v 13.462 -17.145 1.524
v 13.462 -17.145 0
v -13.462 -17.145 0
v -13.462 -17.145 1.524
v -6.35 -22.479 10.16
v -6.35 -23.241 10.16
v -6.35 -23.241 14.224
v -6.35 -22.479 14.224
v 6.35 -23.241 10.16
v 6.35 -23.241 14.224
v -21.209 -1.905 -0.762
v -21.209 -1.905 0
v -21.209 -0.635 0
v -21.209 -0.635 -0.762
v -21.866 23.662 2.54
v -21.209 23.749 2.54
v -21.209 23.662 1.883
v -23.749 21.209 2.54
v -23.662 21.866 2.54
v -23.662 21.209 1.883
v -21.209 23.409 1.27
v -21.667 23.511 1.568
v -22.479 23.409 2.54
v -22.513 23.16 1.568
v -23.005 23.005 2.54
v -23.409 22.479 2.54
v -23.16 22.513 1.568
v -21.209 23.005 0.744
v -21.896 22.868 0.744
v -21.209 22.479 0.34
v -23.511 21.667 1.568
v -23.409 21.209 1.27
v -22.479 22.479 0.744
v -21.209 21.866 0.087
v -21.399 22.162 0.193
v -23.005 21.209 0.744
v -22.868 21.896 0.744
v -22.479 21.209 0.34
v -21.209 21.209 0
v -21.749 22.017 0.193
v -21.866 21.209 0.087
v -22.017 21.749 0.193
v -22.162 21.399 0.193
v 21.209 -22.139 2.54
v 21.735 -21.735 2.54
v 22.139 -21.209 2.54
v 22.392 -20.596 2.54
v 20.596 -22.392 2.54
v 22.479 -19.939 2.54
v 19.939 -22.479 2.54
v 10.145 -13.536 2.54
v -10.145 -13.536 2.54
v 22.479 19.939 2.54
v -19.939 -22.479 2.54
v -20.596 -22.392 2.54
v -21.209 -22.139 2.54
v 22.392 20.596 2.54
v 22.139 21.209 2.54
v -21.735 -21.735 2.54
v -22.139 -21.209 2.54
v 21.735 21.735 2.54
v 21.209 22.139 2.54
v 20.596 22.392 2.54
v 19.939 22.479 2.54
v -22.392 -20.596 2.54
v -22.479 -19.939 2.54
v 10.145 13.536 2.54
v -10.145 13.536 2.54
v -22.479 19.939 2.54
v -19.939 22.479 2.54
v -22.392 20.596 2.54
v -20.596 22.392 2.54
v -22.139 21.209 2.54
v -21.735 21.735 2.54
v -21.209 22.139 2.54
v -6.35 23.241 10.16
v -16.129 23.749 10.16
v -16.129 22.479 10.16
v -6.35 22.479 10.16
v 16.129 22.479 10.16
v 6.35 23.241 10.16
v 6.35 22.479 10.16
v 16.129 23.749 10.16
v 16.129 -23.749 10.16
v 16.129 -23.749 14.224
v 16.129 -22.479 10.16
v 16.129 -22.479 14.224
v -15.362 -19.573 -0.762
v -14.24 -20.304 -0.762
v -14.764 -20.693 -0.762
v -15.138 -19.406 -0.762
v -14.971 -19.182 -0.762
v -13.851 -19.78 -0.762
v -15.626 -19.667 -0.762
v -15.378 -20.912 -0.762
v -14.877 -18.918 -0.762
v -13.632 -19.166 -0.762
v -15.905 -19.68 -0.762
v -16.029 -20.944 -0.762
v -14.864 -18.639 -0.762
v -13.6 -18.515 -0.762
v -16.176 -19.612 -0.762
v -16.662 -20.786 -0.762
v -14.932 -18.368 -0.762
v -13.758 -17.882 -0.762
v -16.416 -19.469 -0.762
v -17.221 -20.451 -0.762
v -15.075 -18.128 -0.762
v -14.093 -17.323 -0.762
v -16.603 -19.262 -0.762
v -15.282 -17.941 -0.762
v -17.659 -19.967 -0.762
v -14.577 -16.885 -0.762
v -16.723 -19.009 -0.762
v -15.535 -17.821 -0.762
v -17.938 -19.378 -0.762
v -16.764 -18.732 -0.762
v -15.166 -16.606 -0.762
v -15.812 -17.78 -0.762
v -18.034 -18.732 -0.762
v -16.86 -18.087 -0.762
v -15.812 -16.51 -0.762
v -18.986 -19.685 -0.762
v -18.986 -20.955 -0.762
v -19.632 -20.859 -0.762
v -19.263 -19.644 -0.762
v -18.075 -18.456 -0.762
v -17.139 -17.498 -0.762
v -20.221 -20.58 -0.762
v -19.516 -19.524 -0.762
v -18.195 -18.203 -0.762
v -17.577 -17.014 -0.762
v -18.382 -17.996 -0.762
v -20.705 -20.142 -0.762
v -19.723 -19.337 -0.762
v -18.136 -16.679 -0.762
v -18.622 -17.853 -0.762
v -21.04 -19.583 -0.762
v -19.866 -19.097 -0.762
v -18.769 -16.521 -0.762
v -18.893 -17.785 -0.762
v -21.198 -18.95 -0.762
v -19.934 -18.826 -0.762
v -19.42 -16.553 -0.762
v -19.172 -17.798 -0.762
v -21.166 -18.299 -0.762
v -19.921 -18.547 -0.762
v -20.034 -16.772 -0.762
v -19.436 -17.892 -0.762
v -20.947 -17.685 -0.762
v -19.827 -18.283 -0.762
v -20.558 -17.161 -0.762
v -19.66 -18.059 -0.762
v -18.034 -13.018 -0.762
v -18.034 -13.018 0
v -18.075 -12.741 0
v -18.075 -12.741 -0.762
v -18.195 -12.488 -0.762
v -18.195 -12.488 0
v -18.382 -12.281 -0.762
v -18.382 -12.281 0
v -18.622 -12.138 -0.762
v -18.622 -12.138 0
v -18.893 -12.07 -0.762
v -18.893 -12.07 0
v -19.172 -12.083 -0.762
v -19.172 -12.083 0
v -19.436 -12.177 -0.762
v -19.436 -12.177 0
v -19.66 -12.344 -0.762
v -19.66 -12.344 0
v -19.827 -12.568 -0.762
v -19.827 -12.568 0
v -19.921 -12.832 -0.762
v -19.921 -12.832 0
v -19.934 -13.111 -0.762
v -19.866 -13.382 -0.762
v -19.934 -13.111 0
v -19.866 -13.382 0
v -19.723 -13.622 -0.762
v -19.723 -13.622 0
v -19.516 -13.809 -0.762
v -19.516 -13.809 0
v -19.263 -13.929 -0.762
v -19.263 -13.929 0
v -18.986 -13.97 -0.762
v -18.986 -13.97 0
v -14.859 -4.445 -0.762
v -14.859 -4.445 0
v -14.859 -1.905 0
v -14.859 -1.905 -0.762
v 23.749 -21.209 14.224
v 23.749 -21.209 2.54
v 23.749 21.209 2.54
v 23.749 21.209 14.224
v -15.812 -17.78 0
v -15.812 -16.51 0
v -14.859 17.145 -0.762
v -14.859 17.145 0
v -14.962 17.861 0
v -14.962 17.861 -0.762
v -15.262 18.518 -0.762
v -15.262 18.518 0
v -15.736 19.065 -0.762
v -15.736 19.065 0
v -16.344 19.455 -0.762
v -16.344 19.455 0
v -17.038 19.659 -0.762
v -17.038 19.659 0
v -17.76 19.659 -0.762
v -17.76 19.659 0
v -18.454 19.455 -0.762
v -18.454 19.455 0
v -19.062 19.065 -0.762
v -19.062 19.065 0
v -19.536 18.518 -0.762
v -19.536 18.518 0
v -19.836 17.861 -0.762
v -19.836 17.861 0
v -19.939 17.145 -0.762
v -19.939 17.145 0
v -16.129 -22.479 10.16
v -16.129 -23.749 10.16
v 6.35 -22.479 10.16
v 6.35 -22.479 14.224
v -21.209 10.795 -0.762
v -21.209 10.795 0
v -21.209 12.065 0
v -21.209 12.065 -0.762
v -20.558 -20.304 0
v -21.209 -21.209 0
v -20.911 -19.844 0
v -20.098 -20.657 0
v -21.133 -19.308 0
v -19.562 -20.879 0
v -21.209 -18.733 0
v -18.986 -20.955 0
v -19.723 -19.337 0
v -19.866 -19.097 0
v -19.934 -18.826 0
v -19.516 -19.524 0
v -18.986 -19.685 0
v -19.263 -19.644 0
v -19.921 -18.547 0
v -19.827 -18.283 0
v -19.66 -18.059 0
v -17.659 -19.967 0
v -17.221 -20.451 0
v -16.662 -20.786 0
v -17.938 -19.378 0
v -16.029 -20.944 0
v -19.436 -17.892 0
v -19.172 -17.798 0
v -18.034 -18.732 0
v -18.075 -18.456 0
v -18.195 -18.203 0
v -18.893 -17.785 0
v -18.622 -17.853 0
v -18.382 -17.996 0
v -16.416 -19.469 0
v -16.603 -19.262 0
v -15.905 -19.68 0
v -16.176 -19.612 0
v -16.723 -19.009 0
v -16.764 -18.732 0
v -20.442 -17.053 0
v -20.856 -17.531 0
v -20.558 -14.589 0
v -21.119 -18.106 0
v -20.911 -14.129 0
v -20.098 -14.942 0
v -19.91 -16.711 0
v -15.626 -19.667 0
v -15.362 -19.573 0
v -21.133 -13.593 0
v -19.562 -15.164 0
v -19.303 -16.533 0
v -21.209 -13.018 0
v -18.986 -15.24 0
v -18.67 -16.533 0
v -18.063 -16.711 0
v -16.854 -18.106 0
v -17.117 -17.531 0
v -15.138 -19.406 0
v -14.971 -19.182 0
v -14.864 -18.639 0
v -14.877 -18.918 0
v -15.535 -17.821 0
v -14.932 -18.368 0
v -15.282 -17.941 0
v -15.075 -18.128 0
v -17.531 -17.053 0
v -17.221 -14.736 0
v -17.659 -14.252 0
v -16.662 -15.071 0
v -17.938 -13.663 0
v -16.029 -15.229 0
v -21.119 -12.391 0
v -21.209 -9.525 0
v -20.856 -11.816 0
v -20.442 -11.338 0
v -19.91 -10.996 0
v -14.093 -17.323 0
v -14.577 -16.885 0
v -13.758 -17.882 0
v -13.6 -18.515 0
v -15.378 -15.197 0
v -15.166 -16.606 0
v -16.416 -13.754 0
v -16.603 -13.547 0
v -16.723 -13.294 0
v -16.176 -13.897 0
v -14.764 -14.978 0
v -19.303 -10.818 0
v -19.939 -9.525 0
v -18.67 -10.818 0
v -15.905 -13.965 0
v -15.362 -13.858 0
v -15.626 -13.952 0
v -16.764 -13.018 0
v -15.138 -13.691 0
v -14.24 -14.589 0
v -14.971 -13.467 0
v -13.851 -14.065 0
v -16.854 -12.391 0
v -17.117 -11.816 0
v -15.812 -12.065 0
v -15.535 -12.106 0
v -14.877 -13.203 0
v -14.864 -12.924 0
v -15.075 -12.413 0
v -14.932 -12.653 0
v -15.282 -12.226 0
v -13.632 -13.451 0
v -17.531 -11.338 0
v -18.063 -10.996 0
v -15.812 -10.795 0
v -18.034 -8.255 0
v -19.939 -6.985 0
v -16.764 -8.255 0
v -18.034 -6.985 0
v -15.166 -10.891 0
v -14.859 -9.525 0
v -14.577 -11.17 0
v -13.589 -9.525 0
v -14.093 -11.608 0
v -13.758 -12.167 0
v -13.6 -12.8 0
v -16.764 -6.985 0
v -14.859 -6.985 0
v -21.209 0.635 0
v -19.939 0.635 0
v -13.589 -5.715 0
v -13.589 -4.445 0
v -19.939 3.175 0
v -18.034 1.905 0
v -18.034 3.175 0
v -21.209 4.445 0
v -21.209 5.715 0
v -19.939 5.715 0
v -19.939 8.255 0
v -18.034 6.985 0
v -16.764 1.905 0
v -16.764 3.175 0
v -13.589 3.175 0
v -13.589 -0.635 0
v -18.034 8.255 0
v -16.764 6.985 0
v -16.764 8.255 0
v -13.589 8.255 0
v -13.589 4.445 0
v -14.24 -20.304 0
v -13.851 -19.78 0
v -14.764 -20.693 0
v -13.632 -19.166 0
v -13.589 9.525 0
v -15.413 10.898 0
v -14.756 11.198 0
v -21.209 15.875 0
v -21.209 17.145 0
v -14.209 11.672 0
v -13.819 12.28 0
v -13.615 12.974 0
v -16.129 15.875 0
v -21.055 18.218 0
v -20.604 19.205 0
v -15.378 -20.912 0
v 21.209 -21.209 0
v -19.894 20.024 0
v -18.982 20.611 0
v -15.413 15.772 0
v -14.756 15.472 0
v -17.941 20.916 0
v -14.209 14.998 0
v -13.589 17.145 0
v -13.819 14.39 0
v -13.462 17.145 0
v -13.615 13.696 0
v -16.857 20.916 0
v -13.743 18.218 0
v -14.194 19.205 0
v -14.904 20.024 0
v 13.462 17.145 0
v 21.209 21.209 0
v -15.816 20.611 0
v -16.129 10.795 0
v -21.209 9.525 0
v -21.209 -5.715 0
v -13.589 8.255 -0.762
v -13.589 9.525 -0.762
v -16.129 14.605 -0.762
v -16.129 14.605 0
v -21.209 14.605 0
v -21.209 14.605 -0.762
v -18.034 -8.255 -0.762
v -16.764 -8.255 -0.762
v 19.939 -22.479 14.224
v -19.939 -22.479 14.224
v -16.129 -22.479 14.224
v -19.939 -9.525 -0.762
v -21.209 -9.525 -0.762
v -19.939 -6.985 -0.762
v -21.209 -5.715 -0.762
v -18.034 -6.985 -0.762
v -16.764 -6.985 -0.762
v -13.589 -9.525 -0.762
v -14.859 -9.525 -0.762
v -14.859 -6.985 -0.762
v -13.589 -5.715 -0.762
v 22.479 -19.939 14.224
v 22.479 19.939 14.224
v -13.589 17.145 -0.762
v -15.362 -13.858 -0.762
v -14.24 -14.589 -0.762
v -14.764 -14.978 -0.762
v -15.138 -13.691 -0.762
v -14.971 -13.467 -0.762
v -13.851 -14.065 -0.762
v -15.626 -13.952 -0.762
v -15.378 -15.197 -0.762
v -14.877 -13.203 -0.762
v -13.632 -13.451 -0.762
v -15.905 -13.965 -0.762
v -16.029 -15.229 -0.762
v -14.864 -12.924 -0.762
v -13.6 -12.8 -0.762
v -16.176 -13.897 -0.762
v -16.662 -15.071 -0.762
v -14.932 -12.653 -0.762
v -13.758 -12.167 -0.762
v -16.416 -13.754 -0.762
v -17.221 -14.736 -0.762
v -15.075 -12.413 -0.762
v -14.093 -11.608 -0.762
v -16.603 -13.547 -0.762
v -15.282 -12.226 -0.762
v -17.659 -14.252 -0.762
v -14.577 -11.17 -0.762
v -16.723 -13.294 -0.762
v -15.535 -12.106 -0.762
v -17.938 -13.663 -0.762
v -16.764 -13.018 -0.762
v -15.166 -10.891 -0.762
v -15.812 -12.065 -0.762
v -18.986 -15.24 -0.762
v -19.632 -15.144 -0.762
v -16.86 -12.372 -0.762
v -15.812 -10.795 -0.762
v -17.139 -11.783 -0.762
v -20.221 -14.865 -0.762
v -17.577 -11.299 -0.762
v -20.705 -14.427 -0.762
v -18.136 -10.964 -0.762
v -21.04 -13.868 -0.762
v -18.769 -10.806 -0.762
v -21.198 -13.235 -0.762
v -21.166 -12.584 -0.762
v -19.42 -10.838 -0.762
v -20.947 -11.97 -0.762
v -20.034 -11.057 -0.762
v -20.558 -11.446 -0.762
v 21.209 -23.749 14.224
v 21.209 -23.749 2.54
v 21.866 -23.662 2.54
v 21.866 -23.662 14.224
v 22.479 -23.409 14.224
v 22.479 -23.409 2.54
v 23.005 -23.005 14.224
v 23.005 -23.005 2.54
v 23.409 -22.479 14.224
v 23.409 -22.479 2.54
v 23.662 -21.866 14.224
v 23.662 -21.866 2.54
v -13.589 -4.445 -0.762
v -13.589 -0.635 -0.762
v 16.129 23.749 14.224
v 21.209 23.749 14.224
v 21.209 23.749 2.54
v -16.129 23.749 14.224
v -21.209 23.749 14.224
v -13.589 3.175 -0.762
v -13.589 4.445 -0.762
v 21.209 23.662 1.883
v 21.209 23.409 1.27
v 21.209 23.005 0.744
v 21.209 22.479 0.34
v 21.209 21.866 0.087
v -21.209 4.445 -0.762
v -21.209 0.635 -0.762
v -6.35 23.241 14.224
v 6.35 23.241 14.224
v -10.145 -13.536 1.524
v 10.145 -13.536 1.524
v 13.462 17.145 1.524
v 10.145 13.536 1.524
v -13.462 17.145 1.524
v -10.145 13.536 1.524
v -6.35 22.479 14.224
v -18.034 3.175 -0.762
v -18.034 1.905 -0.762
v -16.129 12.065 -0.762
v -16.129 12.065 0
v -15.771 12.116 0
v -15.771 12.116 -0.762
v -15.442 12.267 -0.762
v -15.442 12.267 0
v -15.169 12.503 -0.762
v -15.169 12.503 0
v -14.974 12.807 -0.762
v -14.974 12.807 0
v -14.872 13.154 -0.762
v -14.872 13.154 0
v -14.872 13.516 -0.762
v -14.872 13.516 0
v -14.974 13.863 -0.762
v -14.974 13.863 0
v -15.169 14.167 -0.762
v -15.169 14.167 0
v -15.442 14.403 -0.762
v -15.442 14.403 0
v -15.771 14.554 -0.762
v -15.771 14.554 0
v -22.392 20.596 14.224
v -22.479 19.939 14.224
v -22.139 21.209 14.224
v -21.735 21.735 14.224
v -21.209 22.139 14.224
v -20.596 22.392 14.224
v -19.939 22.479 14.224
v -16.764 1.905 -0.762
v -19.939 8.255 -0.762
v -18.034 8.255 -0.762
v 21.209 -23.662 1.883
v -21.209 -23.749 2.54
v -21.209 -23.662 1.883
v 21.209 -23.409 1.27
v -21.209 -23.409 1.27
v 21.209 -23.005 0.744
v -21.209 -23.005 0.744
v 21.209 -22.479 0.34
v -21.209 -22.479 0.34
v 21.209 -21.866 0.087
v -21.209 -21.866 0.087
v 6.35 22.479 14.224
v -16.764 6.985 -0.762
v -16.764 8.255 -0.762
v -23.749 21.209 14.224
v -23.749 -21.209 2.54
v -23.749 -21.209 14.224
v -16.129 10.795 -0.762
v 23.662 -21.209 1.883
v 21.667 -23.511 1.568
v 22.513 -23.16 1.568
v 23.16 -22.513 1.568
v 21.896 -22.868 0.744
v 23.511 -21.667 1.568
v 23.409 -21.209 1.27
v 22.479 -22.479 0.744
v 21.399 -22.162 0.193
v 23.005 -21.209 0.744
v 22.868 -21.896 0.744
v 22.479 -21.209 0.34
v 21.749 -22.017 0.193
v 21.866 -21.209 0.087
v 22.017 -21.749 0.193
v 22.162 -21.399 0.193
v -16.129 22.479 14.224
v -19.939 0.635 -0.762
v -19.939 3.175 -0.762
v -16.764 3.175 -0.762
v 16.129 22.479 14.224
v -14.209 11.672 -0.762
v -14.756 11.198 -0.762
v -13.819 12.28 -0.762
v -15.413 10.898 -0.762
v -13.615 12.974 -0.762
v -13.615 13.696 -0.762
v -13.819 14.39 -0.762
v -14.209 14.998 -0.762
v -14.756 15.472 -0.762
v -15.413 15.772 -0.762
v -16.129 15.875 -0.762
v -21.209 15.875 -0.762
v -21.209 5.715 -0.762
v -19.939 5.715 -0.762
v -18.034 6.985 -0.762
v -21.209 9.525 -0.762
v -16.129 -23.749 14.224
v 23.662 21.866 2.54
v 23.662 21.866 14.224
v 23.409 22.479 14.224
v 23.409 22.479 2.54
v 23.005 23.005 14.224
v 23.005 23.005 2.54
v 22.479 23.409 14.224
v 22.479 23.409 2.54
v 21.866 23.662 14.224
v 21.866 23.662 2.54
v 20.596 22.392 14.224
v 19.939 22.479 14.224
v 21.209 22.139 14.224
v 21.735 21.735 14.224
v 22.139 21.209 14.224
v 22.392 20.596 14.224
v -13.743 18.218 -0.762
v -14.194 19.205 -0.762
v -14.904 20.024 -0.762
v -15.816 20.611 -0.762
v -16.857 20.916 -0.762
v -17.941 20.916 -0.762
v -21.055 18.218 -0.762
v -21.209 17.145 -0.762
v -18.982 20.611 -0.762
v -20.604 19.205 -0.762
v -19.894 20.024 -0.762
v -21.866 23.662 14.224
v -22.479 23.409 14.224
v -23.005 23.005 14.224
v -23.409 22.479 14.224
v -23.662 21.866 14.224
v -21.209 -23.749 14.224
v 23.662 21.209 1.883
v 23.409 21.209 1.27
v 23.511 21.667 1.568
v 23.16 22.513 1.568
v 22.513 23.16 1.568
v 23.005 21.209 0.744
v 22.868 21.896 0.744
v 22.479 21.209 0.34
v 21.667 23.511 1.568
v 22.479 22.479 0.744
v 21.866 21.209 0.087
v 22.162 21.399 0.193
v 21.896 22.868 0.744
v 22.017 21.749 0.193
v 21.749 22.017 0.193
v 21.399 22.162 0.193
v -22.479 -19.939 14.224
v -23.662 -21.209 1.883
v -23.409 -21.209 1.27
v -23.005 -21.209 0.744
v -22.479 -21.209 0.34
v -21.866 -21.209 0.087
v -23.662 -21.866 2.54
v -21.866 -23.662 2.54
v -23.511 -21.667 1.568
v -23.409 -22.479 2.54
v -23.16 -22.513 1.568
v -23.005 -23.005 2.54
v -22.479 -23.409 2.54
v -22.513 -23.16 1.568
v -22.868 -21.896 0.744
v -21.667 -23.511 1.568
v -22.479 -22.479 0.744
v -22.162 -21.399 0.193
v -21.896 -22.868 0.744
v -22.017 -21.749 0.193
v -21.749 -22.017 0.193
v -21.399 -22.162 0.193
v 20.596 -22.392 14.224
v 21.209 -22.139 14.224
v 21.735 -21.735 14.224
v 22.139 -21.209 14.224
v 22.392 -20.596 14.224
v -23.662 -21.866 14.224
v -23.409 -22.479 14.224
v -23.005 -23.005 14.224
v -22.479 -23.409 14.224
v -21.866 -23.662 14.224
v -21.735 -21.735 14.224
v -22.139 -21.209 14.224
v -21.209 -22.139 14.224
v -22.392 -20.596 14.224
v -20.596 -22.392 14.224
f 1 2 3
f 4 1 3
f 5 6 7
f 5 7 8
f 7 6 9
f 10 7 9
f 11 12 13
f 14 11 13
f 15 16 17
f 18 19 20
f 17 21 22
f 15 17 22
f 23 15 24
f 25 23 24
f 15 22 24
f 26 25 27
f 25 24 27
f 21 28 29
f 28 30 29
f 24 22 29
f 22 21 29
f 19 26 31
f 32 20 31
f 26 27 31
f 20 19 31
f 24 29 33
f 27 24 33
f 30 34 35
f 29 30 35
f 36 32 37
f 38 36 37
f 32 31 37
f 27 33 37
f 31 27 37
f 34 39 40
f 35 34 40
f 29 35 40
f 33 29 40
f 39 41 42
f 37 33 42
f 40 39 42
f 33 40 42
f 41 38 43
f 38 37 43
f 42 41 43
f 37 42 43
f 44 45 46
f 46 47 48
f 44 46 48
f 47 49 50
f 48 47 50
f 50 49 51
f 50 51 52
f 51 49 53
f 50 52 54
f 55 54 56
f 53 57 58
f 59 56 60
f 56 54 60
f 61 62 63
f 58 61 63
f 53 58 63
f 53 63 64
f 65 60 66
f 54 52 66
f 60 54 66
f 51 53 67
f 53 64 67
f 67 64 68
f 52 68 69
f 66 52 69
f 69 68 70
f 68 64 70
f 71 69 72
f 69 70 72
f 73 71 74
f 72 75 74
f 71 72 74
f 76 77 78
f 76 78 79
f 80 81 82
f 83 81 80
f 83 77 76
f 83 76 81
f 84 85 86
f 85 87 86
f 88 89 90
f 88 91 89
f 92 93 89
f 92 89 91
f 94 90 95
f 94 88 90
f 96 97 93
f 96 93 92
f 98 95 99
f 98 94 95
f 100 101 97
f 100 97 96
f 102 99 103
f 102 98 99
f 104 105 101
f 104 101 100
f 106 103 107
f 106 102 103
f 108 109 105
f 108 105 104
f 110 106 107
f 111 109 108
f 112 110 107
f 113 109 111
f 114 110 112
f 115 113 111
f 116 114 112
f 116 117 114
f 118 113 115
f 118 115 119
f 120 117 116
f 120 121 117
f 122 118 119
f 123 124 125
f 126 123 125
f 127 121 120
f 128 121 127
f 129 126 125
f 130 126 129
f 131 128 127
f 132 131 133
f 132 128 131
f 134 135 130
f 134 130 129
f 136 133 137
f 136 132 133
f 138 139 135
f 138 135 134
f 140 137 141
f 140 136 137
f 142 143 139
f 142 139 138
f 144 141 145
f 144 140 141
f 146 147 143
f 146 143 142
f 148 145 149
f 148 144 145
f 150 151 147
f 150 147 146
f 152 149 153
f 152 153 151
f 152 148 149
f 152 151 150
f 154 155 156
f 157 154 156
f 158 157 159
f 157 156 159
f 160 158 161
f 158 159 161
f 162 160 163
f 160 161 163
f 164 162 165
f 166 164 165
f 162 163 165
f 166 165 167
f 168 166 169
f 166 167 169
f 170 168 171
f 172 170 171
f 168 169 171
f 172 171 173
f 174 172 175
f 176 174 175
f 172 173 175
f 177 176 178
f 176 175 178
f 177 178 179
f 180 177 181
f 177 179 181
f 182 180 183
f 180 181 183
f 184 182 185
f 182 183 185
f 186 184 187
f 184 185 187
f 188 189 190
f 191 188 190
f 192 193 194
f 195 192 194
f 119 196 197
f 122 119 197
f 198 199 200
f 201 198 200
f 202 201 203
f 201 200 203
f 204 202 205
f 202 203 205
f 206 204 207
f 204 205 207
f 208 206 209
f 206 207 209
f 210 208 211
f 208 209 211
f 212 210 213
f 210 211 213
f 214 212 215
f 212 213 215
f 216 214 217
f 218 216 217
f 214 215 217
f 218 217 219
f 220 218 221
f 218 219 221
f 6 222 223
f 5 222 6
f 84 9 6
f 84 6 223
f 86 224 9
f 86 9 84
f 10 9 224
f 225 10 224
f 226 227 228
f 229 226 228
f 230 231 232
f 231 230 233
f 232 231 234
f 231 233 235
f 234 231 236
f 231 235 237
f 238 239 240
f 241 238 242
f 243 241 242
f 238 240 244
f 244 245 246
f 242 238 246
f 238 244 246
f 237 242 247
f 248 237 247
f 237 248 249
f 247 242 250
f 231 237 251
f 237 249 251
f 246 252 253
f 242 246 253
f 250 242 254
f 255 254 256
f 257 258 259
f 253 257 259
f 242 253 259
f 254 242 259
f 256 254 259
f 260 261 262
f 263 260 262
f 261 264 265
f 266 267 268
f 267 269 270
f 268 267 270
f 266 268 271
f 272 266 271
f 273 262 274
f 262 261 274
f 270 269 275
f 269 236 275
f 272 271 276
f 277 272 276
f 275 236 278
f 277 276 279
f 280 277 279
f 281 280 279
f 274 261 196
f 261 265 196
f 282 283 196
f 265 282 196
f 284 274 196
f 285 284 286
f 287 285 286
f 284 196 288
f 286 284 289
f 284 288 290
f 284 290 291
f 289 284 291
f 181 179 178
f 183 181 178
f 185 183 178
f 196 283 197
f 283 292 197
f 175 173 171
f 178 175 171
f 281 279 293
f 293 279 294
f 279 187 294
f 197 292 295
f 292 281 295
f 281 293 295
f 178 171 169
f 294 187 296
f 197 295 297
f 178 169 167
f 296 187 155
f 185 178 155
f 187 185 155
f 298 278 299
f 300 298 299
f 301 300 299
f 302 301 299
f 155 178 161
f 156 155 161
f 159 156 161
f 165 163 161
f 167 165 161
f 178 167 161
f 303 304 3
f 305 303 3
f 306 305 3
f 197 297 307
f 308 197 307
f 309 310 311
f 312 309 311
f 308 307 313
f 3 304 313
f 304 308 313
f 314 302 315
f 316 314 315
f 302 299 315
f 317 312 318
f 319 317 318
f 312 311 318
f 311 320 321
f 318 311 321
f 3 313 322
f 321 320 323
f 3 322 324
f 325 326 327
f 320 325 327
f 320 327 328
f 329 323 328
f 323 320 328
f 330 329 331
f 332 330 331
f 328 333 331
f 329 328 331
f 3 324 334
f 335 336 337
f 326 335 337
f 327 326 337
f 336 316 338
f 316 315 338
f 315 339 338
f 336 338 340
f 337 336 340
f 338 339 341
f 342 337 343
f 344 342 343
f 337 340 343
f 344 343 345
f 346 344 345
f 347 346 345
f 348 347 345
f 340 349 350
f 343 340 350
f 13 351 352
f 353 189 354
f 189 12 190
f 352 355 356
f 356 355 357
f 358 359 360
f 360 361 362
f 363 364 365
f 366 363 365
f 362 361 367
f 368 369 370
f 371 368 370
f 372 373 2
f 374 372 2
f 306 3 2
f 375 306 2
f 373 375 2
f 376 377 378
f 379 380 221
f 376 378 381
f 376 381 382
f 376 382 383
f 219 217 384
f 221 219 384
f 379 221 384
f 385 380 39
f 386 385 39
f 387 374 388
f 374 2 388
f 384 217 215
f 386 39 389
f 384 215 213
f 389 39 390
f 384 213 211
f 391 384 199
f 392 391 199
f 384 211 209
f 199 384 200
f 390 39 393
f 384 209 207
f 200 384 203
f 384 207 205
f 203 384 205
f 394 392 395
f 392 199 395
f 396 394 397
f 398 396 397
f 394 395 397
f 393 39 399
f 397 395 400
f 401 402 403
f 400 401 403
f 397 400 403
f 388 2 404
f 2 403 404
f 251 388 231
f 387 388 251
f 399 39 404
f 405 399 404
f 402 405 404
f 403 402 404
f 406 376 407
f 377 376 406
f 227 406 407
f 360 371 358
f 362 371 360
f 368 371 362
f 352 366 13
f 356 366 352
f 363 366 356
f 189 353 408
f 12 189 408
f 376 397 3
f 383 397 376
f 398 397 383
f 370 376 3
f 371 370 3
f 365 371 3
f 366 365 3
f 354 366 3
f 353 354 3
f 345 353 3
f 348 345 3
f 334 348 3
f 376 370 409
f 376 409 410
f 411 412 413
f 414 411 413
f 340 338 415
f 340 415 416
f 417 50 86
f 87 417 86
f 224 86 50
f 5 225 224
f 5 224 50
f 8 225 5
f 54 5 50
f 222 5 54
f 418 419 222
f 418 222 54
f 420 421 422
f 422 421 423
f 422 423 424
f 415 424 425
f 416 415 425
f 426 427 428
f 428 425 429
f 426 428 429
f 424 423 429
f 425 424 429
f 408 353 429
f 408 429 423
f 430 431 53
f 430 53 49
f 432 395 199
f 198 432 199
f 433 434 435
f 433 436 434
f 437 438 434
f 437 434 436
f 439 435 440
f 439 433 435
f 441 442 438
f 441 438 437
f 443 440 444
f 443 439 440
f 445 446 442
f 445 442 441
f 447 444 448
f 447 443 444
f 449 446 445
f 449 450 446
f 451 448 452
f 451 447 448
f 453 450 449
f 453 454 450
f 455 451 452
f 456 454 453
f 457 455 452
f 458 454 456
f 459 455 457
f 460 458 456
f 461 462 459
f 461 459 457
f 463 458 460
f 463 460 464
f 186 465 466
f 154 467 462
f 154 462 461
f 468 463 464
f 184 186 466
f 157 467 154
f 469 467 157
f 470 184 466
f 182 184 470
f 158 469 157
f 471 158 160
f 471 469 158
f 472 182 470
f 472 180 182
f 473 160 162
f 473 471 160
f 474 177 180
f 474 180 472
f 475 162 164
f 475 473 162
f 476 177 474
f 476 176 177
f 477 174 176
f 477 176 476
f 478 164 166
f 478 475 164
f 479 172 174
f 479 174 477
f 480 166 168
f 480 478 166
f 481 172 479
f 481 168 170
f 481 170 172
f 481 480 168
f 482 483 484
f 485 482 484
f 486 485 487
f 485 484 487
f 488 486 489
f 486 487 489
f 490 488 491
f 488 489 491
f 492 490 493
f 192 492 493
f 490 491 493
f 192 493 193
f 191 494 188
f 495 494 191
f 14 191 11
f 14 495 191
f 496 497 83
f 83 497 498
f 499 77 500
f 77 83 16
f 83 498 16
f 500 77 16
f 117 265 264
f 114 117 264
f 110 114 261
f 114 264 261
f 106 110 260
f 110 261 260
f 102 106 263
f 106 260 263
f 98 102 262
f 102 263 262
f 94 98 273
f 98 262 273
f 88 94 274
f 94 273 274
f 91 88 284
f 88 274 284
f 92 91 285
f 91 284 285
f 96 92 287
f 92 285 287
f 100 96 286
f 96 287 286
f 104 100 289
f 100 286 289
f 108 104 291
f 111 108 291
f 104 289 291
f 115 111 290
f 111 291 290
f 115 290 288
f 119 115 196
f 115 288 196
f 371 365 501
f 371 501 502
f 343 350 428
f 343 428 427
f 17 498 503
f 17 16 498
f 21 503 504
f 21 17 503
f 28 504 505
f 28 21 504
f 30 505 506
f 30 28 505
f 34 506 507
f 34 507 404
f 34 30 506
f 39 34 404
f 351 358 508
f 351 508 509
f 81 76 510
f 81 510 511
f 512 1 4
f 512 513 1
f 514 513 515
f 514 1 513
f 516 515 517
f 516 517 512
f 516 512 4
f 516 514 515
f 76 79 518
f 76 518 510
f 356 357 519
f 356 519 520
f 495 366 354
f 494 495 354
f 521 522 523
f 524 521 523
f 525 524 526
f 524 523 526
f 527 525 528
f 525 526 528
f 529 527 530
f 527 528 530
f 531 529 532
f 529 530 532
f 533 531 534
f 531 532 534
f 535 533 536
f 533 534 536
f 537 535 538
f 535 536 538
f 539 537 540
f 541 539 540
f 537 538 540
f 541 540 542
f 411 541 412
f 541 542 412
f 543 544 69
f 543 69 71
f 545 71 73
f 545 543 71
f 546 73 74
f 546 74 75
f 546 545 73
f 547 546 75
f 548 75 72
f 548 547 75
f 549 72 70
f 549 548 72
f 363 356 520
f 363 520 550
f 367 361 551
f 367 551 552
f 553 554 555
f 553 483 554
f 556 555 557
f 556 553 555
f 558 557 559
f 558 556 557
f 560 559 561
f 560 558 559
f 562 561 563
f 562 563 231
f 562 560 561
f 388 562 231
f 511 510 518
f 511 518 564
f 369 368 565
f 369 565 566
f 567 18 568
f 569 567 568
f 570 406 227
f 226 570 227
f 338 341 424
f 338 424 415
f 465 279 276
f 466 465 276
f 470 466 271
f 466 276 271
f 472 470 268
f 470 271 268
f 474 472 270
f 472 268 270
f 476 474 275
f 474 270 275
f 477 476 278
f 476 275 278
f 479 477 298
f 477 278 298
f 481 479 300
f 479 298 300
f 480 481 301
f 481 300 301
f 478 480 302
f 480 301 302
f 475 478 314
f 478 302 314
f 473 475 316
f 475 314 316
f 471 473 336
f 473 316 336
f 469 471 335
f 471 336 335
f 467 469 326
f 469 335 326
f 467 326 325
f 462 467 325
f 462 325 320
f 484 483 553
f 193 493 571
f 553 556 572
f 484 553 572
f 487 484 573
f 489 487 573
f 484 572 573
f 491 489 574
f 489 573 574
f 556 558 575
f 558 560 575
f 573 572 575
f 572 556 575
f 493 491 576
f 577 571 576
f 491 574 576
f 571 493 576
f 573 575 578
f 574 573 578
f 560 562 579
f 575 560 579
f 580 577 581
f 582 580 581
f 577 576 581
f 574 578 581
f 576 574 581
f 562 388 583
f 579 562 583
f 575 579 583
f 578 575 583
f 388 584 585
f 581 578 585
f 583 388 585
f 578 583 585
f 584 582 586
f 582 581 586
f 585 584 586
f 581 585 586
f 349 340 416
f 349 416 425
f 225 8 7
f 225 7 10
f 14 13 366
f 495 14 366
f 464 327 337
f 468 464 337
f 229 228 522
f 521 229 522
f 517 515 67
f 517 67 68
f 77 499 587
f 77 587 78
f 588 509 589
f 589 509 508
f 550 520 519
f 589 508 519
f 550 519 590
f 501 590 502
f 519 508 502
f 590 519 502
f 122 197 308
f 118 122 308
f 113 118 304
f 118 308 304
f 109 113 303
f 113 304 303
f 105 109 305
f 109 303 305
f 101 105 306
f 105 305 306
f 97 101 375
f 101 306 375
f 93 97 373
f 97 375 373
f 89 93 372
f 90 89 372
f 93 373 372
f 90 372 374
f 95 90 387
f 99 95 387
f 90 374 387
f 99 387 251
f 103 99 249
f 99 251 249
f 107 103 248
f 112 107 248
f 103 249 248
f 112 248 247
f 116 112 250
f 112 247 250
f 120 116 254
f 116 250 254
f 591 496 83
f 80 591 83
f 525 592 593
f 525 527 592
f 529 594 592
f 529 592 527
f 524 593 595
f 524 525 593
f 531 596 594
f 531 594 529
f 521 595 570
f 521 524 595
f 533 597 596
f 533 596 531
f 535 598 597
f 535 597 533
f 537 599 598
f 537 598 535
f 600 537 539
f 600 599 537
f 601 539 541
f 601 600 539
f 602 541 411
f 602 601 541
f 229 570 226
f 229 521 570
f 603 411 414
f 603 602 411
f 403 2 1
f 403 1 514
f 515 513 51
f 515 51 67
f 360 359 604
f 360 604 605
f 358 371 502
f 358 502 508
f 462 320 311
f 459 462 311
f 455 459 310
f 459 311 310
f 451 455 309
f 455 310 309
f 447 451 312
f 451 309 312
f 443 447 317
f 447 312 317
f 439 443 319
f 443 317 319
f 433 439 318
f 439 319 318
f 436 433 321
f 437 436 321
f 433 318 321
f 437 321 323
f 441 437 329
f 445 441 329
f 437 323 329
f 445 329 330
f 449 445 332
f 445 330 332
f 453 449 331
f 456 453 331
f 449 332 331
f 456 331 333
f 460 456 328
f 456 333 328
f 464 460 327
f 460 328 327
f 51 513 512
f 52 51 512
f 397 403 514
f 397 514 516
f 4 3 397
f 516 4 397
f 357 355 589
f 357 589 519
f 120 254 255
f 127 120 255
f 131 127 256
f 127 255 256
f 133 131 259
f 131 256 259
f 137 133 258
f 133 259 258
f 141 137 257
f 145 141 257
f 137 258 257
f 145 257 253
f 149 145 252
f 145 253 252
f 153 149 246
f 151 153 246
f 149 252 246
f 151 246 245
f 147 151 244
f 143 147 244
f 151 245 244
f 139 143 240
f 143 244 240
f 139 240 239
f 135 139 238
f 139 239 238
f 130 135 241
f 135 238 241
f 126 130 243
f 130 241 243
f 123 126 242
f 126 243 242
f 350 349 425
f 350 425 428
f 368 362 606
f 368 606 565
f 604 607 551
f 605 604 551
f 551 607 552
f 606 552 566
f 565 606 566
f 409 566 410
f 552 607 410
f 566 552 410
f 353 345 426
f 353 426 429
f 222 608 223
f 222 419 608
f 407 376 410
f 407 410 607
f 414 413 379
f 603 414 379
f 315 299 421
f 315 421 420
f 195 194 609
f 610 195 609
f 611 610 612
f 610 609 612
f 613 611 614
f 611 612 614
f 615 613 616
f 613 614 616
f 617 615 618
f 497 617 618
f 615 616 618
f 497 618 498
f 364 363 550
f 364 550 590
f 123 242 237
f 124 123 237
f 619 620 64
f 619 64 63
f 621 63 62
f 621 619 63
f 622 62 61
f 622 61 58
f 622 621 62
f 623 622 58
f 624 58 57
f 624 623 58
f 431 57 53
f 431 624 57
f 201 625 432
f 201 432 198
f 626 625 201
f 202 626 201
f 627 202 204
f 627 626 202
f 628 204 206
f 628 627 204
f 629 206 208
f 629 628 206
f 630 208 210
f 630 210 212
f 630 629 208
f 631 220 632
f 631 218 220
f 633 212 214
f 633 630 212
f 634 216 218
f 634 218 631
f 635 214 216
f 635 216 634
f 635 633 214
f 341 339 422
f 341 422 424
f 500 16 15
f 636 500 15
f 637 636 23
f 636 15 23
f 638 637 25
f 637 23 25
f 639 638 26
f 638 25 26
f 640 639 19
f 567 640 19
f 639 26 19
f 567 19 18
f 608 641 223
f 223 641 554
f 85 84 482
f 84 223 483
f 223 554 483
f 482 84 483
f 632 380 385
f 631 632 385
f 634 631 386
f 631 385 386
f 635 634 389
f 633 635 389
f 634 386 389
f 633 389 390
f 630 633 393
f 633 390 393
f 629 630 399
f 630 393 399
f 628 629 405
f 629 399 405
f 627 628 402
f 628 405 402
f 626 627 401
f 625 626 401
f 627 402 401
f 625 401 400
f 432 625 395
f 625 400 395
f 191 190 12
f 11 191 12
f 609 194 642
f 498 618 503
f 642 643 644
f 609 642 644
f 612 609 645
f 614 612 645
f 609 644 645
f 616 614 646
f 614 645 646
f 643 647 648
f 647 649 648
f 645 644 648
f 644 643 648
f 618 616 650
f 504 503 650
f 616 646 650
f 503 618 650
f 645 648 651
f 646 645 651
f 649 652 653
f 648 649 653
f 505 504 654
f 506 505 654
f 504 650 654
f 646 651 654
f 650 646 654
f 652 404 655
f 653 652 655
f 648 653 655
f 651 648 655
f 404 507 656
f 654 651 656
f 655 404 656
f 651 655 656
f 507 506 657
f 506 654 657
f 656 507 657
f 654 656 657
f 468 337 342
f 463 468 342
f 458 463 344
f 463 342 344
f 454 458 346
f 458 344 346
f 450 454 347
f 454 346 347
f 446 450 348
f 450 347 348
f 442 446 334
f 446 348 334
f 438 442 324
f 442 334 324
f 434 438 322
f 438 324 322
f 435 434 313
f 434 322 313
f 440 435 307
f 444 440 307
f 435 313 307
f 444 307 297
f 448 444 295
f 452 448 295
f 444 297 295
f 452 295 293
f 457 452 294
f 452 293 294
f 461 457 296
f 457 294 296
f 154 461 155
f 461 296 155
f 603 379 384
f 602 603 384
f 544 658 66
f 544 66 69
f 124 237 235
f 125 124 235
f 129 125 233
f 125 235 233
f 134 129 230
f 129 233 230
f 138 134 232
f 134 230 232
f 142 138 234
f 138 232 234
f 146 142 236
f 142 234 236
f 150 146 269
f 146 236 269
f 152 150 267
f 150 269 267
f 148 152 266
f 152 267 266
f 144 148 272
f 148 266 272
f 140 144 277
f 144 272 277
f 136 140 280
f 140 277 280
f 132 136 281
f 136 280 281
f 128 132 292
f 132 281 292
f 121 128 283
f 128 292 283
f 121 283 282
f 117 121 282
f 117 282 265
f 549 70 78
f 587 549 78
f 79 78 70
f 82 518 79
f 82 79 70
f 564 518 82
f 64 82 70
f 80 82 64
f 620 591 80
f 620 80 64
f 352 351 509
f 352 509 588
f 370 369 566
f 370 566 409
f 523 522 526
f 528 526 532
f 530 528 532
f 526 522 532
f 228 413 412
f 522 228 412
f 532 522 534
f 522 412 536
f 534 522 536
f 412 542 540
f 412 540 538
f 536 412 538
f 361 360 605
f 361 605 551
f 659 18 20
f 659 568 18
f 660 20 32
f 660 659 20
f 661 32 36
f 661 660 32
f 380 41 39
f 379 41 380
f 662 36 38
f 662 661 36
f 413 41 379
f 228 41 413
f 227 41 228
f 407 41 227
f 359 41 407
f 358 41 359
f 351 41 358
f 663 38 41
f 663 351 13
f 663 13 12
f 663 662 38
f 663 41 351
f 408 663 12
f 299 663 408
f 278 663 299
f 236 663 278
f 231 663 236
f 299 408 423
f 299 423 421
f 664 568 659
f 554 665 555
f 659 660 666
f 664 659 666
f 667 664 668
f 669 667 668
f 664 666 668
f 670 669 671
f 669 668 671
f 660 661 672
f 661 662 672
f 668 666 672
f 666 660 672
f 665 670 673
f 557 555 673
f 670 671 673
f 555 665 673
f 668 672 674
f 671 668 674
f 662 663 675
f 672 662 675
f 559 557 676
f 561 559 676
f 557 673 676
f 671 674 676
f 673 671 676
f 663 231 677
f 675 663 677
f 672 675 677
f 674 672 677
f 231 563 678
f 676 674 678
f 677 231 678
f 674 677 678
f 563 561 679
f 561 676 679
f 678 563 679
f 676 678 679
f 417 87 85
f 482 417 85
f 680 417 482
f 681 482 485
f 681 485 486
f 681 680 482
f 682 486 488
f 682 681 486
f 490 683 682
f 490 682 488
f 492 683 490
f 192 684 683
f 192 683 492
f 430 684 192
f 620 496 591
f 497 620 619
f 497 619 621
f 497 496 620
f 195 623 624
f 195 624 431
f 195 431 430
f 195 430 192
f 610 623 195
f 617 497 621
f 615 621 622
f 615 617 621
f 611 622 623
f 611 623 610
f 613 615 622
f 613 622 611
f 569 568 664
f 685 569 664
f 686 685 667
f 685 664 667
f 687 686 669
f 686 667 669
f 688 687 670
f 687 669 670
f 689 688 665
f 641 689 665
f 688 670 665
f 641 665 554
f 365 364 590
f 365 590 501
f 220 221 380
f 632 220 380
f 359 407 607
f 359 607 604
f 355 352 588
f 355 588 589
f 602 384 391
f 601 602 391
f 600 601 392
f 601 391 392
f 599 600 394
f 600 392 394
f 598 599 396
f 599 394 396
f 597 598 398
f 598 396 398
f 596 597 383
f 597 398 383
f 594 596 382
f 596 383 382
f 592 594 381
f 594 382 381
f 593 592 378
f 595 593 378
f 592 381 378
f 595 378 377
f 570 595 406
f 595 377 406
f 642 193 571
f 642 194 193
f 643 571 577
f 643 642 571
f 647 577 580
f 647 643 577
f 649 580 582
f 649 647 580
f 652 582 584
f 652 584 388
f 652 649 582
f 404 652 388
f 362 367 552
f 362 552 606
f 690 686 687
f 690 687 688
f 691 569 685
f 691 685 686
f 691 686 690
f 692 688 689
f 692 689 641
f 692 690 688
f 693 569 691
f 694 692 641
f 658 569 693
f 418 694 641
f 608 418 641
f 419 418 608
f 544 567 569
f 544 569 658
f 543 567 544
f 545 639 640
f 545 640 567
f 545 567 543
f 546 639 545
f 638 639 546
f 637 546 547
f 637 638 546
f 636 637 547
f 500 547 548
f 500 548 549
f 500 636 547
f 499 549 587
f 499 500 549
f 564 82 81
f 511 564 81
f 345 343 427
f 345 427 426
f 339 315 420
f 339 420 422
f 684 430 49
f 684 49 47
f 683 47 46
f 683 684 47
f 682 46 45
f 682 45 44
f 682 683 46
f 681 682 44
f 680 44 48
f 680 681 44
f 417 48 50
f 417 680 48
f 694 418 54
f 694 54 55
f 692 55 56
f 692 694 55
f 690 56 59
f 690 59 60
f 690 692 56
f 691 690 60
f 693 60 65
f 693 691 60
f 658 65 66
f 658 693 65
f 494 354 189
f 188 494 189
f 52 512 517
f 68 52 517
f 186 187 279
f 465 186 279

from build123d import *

# Parameters (mm, degrees)
BOSS_EXTRUDE1_DEPTH     = 14.224
CUT_EXTRUDE1_DEPTH      = 11.684
FILLET1_R               = 2.54
SKETCH3_W               = 32.258
SKETCH3_H               = 8.128
CUT_EXTRUDE2_DEPTH      = 1
CUT_EXTRUDE2_DEPTH_BACK = 48.498
SKETCH5_W               = 26.924
SKETCH5_H               = 34.29
CUT_EXTRUDE4_DEPTH      = 1.524
SKETCH6_W               = 20.290608306
SKETCH6_H               = 27.072145664
CUT_EXTRUDE5_DEPTH      = 1.524
BOSS_EXTRUDE2_DEPTH     = 0.762
SKETCH8_W               = 12.7
SKETCH8_H               = 0.762
BOSS_EXTRUDE3_DEPTH     = 4.064


with BuildPart() as part:
    # Sketch1 → Boss-Extrude1 (new body)
    with BuildSketch(Plane.XY):
        with BuildLine():
            Line((-21.209, -23.749), (21.209, -23.749))
            ThreePointArc((21.209, -23.749), (23.005051224, -23.005051224), (23.749, -21.209))
            Line((23.749, -21.209), (23.749, 21.209))
            ThreePointArc((23.749, 21.209), (23.005051224, 23.005051224), (21.209, 23.749))
            Line((21.209, 23.749), (-21.209, 23.749))
            ThreePointArc((-21.209, 23.749), (-23.005051224, 23.005051224), (-23.749, 21.209))
            Line((-23.749, 21.209), (-23.749, -21.209))
            ThreePointArc((-23.749, -21.209), (-23.005051224, -23.005051224), (-21.209, -23.749))
        make_face()
    extrude(amount=BOSS_EXTRUDE1_DEPTH)

    # Sketch2 → Cut-Extrude1 (cut)
    with BuildSketch(Plane.XY.offset(14.224)):
        with BuildLine():
            Line((19.939, -22.479), (-19.939, -22.479))
            ThreePointArc((-19.939, -22.479), (-21.735051224, -21.735051224), (-22.479, -19.939))
            Line((-22.479, -19.939), (-22.479, 19.939))
            ThreePointArc((-22.479, 19.939), (-21.735051224, 21.735051224), (-19.939, 22.479))
            Line((-19.939, 22.479), (19.939, 22.479))
            ThreePointArc((19.939, 22.479), (21.735051224, 21.735051224), (22.479, 19.939))
            Line((22.479, 19.939), (22.479, -19.939))
            ThreePointArc((22.479, -19.939), (21.735051224, -21.735051224), (19.939, -22.479))
        make_face()
    extrude(amount=-CUT_EXTRUDE1_DEPTH, mode=Mode.SUBTRACT)

    # Fillet1
    fillet1_edges = [part.edges().sort_by_distance(p)[0] for p in [
        (0, -23.749, 0),
        (-23.005051224, -23.005051224, 0),
        (-23.749, 0, 0),
        (-23.005051224, 23.005051224, 0),
        (0, 23.749, 0),
        (23.005051224, 23.005051224, 0),
        (23.749, 0, 0),
        (23.005051224, -23.005051224, 0),
    ]]
    fillet(fillet1_edges, radius=FILLET1_R)

    # Sketch3 → Cut-Extrude2 (cut, two sides)
    with BuildSketch(Plane(origin=(0, 23.749, 0), x_dir=(1, 0, 0), z_dir=(0, 1, 0))) as cut_extrude2_sk:
        with Locations((0, -14.224)):
            Rectangle(SKETCH3_W, SKETCH3_H)
    extrude(amount=CUT_EXTRUDE2_DEPTH, mode=Mode.SUBTRACT)
    extrude(cut_extrude2_sk.sketch, amount=-CUT_EXTRUDE2_DEPTH_BACK, mode=Mode.SUBTRACT)

    # Sketch5 → Cut-Extrude4 (cut)
    with BuildSketch(Plane(origin=(0, 0, 0), x_dir=(-1, 0, 0), z_dir=(0, 0, -1))):
        Rectangle(SKETCH5_W, SKETCH5_H)
    extrude(amount=-CUT_EXTRUDE4_DEPTH, mode=Mode.SUBTRACT)

    # Sketch6 → Cut-Extrude5 (cut)
    with BuildSketch(Plane(origin=(0, 0, 1.524), x_dir=(-1, 0, 0), z_dir=(0, 0, -1))):
        Rectangle(SKETCH6_W, SKETCH6_H)
    extrude(amount=-CUT_EXTRUDE5_DEPTH, mode=Mode.SUBTRACT)

    # Sketch7 → Boss-Extrude2 (add)
    with BuildSketch(Plane(origin=(0, 0, 0), x_dir=(-1, 0, 0), z_dir=(0, 0, -1))):
        with BuildLine():
            Line((19.939, 17.145), (21.209, 17.145))
            ThreePointArc((21.209, 17.145), (17.399, 20.955), (13.589, 17.145))
            Line((13.589, 17.145), (14.859, 17.145))
            ThreePointArc((14.859, 17.145), (17.399, 19.685), (19.939, 17.145))
        make_face()
        with BuildLine():
            Line((21.209, 15.875), (16.129, 15.875))
            ThreePointArc((16.129, 15.875), (13.589, 13.335), (16.129, 10.795))
            Line((16.129, 10.795), (21.209, 10.795))
            Line((21.209, 10.795), (21.209, 12.065))
            Line((21.209, 12.065), (16.129, 12.065))
            ThreePointArc((16.129, 12.065), (14.859, 13.335), (16.129, 14.605))
            Line((16.129, 14.605), (21.209, 14.605))
            Line((21.209, 14.605), (21.209, 15.875))
        make_face()
        Polygon((13.589, 9.525), (21.209, 9.525), (21.209, 5.715), (19.939, 5.715), (19.939, 8.255), (18.034, 8.255), (18.034, 6.985), (16.764, 6.985), (16.764, 8.255), (13.589, 8.255), align=None)
        Polygon((13.589, 4.445), (21.209, 4.445), (21.209, 0.635), (19.939, 0.635), (19.939, 3.175), (18.034, 3.175), (18.034, 1.905), (16.764, 1.905), (16.764, 3.175), (13.589, 3.175), align=None)
        Polygon((21.209, -0.635), (13.589, -0.635), (13.589, -4.445), (14.859, -4.445), (14.859, -1.905), (21.209, -1.905), align=None)
        Polygon((13.589, -5.715), (21.209, -5.715), (21.209, -9.525), (19.939, -9.525), (19.939, -6.985), (18.034, -6.985), (18.034, -8.255), (16.764, -8.255), (16.764, -6.985), (14.859, -6.985), (14.859, -9.525), (13.589, -9.525), align=None)
        with BuildLine():
            Line((18.9865, -13.97), (18.9865, -15.24))
            ThreePointArc((18.9865, -15.24), (20.558044821, -11.445955179), (16.764, -13.0175))
            ThreePointArc((16.764, -13.0175), (15.137980791, -13.691019209), (15.8115, -12.065))
            Line((15.8115, -12.065), (15.8115, -10.795))
            ThreePointArc((15.8115, -10.795), (14.239955179, -14.589044821), (18.034, -13.0175))
            ThreePointArc((18.034, -13.0175), (19.660019209, -12.343980791), (18.9865, -13.97))
        make_face()
        with BuildLine():
            Line((15.8115, -17.78), (15.8115, -16.51))
            ThreePointArc((15.8115, -16.51), (14.239955179, -20.304044821), (18.034, -18.7325))
            ThreePointArc((18.034, -18.7325), (19.660019209, -18.058980791), (18.9865, -19.685))
            Line((18.9865, -19.685), (18.9865, -20.955))
            ThreePointArc((18.9865, -20.955), (20.558044821, -17.160955179), (16.764, -18.7325))
            ThreePointArc((16.764, -18.7325), (15.137980791, -19.406019209), (15.8115, -17.78))
        make_face()
    extrude(amount=BOSS_EXTRUDE2_DEPTH)

    # Sketch8 → Boss-Extrude3 (add)
    with BuildSketch(Plane.XY.offset(10.16)):
        with Locations((0, 22.86)):
            Rectangle(SKETCH8_W, SKETCH8_H)
        with Locations((0, -22.86)):
            Rectangle(SKETCH8_W, SKETCH8_H)
    extrude(amount=BOSS_EXTRUDE3_DEPTH)


solid = part.part
